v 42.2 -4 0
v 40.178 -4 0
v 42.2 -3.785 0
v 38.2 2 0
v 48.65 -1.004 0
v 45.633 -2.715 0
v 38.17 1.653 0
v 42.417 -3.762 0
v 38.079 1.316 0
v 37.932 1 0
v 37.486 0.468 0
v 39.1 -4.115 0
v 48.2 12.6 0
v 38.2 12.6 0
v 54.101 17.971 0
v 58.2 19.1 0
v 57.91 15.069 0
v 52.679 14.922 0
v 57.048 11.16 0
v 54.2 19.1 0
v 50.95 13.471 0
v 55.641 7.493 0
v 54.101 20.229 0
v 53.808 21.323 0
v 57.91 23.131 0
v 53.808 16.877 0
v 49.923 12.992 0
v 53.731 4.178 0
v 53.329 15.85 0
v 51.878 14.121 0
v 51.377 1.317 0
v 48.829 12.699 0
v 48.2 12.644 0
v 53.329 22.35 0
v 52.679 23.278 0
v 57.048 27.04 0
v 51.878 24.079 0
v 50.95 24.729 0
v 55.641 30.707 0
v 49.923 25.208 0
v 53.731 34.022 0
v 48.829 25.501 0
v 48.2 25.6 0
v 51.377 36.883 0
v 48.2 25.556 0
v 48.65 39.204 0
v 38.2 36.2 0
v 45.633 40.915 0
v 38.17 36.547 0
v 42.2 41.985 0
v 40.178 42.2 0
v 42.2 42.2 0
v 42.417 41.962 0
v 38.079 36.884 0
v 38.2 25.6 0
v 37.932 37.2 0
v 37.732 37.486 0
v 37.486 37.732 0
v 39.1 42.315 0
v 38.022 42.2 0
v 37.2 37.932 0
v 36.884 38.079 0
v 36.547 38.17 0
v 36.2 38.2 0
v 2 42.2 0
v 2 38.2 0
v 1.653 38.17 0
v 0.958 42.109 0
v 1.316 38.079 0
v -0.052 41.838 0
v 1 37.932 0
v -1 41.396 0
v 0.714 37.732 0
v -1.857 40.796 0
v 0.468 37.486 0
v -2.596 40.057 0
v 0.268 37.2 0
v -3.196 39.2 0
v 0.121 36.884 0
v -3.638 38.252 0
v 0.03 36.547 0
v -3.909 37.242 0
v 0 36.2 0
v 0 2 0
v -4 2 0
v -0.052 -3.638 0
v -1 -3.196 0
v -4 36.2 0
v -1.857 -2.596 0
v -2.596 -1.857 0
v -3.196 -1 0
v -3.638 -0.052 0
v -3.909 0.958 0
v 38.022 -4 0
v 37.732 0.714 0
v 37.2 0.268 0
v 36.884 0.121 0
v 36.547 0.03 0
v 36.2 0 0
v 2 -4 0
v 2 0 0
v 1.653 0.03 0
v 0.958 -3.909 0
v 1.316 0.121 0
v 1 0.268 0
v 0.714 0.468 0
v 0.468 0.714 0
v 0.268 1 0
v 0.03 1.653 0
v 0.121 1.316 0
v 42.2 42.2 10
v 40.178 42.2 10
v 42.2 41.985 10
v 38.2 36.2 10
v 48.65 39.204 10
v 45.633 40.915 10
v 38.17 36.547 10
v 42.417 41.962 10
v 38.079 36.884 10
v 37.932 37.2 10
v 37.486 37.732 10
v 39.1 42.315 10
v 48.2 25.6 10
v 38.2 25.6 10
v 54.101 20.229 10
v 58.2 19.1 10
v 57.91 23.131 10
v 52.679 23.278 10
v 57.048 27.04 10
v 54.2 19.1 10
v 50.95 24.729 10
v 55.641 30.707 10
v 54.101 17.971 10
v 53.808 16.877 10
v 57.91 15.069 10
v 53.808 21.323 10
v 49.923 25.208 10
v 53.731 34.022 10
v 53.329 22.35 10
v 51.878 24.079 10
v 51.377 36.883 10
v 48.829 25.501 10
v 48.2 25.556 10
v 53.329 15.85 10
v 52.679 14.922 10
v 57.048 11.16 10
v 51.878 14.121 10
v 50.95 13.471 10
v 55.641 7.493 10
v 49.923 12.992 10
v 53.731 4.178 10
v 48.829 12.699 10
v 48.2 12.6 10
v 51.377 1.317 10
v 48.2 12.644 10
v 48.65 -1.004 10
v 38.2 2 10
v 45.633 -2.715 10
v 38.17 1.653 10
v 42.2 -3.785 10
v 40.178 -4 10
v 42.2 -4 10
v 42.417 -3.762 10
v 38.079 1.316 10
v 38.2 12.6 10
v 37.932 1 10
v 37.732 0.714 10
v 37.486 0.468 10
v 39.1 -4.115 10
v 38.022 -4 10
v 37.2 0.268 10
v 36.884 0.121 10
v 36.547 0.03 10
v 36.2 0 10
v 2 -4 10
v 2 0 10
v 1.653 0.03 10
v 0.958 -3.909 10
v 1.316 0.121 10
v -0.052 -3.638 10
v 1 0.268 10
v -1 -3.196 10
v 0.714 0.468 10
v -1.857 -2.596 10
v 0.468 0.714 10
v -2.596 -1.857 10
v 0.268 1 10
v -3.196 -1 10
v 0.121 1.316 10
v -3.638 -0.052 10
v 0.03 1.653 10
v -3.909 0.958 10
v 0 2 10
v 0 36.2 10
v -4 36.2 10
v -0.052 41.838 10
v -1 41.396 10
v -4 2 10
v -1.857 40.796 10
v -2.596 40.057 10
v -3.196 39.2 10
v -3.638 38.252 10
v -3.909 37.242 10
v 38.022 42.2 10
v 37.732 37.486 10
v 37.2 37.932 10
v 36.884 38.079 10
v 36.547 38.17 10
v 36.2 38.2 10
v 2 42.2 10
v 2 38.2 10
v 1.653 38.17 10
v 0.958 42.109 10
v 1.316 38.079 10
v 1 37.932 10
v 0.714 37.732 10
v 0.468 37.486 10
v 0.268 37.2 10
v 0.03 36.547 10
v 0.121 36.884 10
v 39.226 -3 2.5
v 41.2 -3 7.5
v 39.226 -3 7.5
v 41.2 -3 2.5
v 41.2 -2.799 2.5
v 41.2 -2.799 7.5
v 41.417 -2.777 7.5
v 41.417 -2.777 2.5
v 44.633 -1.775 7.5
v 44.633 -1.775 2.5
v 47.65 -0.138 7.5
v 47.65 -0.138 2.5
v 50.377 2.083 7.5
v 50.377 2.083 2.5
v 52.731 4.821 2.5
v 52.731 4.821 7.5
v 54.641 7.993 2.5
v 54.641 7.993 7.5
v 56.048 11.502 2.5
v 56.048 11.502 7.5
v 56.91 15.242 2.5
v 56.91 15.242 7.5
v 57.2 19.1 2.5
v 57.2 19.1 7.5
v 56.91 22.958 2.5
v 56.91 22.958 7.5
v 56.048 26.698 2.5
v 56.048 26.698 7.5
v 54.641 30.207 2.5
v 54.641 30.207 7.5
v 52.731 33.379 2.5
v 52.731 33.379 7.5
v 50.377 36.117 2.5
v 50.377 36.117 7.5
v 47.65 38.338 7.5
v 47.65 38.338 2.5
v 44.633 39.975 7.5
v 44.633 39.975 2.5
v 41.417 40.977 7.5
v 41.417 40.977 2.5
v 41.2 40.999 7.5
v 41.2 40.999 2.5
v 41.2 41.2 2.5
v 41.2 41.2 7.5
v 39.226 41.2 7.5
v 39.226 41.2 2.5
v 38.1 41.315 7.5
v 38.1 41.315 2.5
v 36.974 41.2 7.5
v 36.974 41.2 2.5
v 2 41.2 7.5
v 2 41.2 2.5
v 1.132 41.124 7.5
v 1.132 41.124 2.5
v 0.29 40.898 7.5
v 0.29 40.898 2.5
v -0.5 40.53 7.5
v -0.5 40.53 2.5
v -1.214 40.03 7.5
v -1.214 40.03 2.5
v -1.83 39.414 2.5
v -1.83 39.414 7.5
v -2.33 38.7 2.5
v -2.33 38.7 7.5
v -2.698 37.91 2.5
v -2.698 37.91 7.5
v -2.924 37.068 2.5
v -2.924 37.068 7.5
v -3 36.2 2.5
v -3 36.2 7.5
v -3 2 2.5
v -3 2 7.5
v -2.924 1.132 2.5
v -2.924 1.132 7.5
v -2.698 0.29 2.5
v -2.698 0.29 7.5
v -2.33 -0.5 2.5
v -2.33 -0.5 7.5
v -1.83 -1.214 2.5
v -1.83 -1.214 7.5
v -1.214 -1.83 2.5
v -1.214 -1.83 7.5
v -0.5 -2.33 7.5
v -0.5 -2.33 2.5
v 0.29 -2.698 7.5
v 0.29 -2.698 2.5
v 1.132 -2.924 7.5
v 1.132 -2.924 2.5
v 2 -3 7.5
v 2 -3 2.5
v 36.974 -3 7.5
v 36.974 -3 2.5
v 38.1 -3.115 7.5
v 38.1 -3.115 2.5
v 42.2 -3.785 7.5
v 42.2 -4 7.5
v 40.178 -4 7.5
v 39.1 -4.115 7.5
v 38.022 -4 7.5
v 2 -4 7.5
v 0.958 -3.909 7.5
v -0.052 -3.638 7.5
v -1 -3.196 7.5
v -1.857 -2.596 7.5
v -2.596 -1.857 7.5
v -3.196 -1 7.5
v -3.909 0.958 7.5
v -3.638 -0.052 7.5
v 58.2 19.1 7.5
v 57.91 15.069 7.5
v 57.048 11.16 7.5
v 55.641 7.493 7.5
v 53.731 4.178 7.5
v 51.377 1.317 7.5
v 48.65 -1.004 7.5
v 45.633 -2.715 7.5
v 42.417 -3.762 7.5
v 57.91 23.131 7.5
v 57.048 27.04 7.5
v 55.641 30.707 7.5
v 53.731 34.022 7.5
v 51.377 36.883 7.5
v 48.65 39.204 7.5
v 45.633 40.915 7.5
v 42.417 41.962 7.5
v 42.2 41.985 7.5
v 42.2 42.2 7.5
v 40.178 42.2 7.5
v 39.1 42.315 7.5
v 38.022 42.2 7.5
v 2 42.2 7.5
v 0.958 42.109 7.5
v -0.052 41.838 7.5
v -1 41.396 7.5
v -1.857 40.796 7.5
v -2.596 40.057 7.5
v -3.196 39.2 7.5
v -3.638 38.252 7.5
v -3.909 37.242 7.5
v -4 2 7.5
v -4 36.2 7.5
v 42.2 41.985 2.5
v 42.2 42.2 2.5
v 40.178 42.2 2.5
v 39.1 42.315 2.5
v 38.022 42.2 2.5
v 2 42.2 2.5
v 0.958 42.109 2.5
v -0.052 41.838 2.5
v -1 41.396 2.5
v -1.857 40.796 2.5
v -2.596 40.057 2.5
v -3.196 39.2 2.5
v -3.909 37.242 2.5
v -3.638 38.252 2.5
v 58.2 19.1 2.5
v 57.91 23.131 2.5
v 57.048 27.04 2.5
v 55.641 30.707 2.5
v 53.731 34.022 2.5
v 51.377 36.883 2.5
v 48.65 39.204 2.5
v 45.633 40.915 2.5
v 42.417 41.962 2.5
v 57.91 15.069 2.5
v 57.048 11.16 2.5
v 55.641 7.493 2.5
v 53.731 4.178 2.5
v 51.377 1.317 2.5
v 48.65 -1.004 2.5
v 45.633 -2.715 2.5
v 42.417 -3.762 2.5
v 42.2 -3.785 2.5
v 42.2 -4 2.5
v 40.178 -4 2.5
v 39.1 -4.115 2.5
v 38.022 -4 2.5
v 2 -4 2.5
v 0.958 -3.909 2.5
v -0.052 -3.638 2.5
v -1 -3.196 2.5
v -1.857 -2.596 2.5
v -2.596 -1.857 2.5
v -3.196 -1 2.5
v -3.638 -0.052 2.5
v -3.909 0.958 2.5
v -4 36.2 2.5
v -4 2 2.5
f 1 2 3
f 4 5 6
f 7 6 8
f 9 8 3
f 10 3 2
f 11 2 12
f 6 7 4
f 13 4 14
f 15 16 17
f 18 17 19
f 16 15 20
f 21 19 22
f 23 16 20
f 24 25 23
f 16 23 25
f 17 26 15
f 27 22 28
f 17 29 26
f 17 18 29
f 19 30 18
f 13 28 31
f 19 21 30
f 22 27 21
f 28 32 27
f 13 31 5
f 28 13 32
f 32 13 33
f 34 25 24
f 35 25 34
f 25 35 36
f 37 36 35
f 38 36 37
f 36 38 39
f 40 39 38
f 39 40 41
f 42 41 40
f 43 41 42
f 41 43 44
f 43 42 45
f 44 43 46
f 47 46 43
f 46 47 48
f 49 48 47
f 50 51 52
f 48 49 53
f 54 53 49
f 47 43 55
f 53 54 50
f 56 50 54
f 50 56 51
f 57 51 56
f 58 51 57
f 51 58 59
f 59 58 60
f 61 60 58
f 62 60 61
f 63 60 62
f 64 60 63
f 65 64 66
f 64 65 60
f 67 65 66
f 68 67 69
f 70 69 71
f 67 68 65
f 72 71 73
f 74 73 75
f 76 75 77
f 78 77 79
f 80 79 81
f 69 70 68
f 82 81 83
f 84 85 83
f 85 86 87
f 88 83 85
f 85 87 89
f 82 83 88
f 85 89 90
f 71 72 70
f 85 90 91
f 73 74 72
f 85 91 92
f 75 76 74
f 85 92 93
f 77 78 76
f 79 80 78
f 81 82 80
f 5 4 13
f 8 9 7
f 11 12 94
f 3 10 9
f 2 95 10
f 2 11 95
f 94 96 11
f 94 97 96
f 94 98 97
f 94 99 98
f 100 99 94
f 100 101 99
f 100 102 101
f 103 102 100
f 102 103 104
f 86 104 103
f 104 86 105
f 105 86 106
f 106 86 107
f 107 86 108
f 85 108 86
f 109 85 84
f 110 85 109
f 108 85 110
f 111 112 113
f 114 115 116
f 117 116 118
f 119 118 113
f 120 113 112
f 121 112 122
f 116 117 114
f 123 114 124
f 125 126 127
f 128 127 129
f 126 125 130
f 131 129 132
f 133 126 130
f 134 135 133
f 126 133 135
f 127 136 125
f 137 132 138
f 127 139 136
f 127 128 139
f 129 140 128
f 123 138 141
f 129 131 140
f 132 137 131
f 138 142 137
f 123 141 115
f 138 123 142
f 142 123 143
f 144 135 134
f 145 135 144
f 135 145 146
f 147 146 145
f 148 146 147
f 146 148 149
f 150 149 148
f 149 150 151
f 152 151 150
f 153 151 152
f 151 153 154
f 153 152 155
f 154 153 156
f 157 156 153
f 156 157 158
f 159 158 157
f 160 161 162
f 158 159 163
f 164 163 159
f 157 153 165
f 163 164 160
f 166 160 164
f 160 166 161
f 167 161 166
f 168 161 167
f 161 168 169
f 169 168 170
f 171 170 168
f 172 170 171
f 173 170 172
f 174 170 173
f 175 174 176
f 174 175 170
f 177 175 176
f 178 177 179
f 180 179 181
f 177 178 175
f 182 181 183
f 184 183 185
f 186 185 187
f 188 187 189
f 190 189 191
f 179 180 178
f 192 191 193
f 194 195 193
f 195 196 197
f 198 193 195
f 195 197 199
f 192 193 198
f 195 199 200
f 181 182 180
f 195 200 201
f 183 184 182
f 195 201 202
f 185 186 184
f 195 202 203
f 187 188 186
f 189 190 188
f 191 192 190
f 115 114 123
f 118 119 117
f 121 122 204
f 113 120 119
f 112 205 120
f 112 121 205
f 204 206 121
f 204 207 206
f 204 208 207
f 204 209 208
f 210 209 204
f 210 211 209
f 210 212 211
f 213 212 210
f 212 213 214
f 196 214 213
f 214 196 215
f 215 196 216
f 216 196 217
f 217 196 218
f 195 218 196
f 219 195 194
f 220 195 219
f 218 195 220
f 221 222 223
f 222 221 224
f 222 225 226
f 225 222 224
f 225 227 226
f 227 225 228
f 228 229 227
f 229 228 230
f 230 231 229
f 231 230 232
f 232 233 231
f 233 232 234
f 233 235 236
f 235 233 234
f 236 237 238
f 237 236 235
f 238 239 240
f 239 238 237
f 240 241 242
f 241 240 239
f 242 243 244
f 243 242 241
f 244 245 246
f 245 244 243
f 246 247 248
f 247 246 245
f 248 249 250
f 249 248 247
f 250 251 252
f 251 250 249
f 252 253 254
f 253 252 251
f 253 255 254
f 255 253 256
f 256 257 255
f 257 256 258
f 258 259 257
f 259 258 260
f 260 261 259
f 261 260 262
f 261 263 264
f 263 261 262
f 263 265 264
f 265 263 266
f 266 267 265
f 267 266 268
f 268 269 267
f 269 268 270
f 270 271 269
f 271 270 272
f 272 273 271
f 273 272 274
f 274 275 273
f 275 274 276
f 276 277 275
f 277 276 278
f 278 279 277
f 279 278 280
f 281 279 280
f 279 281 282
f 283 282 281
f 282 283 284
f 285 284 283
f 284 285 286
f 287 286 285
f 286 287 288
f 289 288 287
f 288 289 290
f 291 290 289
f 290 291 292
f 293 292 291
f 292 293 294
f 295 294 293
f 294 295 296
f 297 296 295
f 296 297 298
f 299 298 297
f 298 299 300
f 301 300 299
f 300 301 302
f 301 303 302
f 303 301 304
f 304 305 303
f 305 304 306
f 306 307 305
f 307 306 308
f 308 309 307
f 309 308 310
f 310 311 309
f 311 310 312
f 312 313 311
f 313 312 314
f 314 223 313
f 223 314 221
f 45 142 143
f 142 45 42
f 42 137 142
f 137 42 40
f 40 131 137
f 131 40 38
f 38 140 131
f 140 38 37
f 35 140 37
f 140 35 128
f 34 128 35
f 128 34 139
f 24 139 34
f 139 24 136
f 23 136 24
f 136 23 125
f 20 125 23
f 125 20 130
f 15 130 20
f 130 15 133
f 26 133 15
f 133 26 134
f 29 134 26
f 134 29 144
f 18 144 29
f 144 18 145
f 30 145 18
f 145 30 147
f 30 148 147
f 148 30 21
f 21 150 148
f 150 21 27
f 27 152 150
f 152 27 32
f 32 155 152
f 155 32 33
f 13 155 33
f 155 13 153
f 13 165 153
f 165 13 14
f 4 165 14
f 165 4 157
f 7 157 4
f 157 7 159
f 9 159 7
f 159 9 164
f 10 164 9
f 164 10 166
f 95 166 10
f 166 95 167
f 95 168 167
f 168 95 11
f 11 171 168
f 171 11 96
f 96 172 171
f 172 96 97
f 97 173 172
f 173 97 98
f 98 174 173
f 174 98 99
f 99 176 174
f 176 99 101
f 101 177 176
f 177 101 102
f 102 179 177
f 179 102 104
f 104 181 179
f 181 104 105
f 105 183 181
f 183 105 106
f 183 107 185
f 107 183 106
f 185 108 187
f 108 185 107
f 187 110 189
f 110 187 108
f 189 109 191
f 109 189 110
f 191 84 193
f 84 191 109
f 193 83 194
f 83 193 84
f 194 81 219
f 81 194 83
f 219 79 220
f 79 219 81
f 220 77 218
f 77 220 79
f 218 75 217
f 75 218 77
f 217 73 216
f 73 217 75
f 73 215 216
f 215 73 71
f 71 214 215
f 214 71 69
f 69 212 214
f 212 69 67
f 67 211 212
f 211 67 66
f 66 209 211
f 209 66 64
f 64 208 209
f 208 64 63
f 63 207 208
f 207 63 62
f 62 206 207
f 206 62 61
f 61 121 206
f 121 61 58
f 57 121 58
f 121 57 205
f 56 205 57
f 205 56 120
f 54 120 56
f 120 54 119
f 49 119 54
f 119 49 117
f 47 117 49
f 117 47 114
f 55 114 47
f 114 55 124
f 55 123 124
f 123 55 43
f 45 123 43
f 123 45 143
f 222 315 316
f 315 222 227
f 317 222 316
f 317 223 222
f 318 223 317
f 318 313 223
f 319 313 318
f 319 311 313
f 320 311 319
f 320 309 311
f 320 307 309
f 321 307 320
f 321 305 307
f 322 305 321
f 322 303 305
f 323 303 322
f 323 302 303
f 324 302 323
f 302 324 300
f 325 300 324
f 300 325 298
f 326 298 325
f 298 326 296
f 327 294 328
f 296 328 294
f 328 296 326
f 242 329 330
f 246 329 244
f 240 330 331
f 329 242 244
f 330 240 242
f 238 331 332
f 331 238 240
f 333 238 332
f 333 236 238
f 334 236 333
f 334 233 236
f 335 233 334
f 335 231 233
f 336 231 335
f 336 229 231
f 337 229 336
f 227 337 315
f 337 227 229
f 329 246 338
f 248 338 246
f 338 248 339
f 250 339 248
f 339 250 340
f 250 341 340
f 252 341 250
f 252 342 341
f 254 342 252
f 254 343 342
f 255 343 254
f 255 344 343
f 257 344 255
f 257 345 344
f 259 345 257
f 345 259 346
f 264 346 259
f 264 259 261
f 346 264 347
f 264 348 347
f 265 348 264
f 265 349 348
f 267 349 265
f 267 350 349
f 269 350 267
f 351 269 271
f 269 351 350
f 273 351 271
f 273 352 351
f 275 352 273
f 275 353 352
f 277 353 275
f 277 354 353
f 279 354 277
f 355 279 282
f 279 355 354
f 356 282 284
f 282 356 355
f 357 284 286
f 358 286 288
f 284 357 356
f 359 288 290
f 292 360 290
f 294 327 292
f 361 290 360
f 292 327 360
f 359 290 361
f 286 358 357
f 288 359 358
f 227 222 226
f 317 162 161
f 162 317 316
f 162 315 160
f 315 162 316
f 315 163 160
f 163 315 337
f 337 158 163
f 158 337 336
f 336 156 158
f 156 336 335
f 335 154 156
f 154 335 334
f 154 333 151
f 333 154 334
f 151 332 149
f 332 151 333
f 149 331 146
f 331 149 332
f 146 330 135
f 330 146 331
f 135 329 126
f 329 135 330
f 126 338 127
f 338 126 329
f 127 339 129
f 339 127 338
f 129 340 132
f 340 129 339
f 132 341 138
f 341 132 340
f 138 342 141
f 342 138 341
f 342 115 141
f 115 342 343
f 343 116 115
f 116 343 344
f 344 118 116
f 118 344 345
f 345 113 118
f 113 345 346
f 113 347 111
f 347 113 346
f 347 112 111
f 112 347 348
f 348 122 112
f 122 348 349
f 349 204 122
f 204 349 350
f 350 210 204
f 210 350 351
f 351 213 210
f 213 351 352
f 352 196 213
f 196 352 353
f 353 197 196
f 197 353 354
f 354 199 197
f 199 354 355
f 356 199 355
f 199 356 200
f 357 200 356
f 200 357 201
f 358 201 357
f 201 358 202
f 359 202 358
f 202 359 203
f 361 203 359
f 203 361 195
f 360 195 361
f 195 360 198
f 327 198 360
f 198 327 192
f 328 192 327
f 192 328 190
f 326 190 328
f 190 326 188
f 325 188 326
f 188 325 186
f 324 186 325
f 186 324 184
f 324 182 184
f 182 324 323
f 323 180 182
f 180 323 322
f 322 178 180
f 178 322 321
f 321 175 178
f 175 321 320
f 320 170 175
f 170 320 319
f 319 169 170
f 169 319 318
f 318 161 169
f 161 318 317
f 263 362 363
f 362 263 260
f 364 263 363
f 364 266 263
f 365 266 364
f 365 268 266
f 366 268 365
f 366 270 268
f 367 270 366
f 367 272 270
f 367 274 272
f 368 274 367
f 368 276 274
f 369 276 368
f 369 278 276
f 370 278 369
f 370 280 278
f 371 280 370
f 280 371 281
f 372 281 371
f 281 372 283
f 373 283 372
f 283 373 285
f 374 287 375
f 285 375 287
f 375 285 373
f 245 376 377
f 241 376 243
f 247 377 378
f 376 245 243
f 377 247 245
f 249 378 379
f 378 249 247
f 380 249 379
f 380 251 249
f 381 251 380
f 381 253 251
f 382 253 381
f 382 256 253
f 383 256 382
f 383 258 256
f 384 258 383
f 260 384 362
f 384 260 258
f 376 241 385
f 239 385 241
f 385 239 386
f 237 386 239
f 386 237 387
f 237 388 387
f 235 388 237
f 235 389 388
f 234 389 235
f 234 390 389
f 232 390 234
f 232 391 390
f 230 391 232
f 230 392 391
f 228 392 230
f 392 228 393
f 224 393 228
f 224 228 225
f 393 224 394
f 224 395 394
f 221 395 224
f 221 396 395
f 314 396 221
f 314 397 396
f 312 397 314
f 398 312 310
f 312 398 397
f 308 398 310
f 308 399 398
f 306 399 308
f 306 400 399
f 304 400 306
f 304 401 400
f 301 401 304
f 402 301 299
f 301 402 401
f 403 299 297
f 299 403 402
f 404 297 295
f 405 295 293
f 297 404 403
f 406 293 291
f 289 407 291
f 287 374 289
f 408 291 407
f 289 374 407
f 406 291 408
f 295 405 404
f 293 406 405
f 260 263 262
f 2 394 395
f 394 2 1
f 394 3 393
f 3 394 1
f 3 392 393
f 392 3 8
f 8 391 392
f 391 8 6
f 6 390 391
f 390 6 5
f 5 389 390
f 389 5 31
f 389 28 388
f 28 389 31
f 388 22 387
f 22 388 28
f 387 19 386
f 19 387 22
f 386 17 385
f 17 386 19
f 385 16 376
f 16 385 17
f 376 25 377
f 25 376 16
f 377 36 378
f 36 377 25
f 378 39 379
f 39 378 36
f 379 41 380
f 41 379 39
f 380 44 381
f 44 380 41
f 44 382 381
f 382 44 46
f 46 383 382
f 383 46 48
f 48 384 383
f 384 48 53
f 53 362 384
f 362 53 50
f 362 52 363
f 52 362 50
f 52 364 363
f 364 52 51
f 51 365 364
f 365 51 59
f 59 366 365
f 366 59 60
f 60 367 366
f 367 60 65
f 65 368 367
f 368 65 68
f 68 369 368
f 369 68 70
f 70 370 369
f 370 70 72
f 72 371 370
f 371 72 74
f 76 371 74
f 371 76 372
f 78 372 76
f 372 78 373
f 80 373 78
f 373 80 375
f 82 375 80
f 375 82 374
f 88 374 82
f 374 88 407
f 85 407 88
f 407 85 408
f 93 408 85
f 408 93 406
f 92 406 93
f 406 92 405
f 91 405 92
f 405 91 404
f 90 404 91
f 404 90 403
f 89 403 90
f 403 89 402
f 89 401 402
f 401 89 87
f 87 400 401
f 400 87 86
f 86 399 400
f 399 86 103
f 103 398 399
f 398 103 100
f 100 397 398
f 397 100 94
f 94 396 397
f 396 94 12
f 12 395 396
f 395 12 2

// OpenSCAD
$fa=0.5;
$fp=1;

ROUND_POST_RADIUS = 6.5;
SQUARE_POST_WIDTH = 38.2;
CORNER_RADIUS = 2;
THICKNESS = 3;
POST_OFFSET = 3;

module rounded_square(post_width, corner_radius, inner=true) {
    union() {
        translate([0, corner_radius]) square([post_width, post_width - (corner_radius * 2)]);
        translate([corner_radius, 0]) square([post_width - (corner_radius * 2), post_width]);
        translate([corner_radius, corner_radius]) circle(r=corner_radius, $fn=36);
        translate([corner_radius, post_width - corner_radius]) circle(r=corner_radius, $fn=36);    
        if (inner) {
            translate([post_width - corner_radius, post_width - corner_radius]) circle(r=corner_radius, $fn=36);    
            translate([post_width - corner_radius, corner_radius]) circle(r=corner_radius, $fn=36);
        }
        else {
            translate([post_width - corner_radius, post_width - corner_radius]) square([corner_radius, corner_radius]);    
            translate([post_width - corner_radius, 0]) square([corner_radius, corner_radius]);
        }
    }
}

module footprint(thickness) {
    translate([-1 * thickness, -1 * thickness]) difference() {
    union() {
        translate([thickness, thickness]) difference() {
            translate([-1 * thickness, -1 * thickness]) rounded_square(SQUARE_POST_WIDTH + (2 * thickness), CORNER_RADIUS + thickness, false);
            rounded_square(SQUARE_POST_WIDTH, CORNER_RADIUS);
        }
        
        
        translate([ROUND_POST_RADIUS + POST_OFFSET + thickness + SQUARE_POST_WIDTH, thickness + (SQUARE_POST_WIDTH / 2)]) 
            difference() {
                difference() {
                    translate([(-1 * (SQUARE_POST_WIDTH/2)) + ROUND_POST_RADIUS + thickness, 0]) scale([1, 0.006 + (SQUARE_POST_WIDTH + (2 * thickness)) / SQUARE_POST_WIDTH]) circle(r=SQUARE_POST_WIDTH/2, $fn=36);
                    circle(r=ROUND_POST_RADIUS, $fn=36);
                }
                translate([-1 * (SQUARE_POST_WIDTH + ROUND_POST_RADIUS + thickness + POST_OFFSET), (-1 * thickness) + (-0.5 * SQUARE_POST_WIDTH)]) square([SQUARE_POST_WIDTH + (2*thickness), SQUARE_POST_WIDTH+ (2*thickness)]);
            }
        }
    translate([thickness + SQUARE_POST_WIDTH - POST_OFFSET, thickness - ROUND_POST_RADIUS + (0.5 * SQUARE_POST_WIDTH)]) square([2*ROUND_POST_RADIUS, 2*ROUND_POST_RADIUS]);
    }    
}

linear_extrude(10) footprint(THICKNESS);
translate([0, 0, 7.5]) linear_extrude(2.5) footprint(THICKNESS + 1);
translate([0, 0, 0]) linear_extrude(2.5) footprint(THICKNESS + 1);
